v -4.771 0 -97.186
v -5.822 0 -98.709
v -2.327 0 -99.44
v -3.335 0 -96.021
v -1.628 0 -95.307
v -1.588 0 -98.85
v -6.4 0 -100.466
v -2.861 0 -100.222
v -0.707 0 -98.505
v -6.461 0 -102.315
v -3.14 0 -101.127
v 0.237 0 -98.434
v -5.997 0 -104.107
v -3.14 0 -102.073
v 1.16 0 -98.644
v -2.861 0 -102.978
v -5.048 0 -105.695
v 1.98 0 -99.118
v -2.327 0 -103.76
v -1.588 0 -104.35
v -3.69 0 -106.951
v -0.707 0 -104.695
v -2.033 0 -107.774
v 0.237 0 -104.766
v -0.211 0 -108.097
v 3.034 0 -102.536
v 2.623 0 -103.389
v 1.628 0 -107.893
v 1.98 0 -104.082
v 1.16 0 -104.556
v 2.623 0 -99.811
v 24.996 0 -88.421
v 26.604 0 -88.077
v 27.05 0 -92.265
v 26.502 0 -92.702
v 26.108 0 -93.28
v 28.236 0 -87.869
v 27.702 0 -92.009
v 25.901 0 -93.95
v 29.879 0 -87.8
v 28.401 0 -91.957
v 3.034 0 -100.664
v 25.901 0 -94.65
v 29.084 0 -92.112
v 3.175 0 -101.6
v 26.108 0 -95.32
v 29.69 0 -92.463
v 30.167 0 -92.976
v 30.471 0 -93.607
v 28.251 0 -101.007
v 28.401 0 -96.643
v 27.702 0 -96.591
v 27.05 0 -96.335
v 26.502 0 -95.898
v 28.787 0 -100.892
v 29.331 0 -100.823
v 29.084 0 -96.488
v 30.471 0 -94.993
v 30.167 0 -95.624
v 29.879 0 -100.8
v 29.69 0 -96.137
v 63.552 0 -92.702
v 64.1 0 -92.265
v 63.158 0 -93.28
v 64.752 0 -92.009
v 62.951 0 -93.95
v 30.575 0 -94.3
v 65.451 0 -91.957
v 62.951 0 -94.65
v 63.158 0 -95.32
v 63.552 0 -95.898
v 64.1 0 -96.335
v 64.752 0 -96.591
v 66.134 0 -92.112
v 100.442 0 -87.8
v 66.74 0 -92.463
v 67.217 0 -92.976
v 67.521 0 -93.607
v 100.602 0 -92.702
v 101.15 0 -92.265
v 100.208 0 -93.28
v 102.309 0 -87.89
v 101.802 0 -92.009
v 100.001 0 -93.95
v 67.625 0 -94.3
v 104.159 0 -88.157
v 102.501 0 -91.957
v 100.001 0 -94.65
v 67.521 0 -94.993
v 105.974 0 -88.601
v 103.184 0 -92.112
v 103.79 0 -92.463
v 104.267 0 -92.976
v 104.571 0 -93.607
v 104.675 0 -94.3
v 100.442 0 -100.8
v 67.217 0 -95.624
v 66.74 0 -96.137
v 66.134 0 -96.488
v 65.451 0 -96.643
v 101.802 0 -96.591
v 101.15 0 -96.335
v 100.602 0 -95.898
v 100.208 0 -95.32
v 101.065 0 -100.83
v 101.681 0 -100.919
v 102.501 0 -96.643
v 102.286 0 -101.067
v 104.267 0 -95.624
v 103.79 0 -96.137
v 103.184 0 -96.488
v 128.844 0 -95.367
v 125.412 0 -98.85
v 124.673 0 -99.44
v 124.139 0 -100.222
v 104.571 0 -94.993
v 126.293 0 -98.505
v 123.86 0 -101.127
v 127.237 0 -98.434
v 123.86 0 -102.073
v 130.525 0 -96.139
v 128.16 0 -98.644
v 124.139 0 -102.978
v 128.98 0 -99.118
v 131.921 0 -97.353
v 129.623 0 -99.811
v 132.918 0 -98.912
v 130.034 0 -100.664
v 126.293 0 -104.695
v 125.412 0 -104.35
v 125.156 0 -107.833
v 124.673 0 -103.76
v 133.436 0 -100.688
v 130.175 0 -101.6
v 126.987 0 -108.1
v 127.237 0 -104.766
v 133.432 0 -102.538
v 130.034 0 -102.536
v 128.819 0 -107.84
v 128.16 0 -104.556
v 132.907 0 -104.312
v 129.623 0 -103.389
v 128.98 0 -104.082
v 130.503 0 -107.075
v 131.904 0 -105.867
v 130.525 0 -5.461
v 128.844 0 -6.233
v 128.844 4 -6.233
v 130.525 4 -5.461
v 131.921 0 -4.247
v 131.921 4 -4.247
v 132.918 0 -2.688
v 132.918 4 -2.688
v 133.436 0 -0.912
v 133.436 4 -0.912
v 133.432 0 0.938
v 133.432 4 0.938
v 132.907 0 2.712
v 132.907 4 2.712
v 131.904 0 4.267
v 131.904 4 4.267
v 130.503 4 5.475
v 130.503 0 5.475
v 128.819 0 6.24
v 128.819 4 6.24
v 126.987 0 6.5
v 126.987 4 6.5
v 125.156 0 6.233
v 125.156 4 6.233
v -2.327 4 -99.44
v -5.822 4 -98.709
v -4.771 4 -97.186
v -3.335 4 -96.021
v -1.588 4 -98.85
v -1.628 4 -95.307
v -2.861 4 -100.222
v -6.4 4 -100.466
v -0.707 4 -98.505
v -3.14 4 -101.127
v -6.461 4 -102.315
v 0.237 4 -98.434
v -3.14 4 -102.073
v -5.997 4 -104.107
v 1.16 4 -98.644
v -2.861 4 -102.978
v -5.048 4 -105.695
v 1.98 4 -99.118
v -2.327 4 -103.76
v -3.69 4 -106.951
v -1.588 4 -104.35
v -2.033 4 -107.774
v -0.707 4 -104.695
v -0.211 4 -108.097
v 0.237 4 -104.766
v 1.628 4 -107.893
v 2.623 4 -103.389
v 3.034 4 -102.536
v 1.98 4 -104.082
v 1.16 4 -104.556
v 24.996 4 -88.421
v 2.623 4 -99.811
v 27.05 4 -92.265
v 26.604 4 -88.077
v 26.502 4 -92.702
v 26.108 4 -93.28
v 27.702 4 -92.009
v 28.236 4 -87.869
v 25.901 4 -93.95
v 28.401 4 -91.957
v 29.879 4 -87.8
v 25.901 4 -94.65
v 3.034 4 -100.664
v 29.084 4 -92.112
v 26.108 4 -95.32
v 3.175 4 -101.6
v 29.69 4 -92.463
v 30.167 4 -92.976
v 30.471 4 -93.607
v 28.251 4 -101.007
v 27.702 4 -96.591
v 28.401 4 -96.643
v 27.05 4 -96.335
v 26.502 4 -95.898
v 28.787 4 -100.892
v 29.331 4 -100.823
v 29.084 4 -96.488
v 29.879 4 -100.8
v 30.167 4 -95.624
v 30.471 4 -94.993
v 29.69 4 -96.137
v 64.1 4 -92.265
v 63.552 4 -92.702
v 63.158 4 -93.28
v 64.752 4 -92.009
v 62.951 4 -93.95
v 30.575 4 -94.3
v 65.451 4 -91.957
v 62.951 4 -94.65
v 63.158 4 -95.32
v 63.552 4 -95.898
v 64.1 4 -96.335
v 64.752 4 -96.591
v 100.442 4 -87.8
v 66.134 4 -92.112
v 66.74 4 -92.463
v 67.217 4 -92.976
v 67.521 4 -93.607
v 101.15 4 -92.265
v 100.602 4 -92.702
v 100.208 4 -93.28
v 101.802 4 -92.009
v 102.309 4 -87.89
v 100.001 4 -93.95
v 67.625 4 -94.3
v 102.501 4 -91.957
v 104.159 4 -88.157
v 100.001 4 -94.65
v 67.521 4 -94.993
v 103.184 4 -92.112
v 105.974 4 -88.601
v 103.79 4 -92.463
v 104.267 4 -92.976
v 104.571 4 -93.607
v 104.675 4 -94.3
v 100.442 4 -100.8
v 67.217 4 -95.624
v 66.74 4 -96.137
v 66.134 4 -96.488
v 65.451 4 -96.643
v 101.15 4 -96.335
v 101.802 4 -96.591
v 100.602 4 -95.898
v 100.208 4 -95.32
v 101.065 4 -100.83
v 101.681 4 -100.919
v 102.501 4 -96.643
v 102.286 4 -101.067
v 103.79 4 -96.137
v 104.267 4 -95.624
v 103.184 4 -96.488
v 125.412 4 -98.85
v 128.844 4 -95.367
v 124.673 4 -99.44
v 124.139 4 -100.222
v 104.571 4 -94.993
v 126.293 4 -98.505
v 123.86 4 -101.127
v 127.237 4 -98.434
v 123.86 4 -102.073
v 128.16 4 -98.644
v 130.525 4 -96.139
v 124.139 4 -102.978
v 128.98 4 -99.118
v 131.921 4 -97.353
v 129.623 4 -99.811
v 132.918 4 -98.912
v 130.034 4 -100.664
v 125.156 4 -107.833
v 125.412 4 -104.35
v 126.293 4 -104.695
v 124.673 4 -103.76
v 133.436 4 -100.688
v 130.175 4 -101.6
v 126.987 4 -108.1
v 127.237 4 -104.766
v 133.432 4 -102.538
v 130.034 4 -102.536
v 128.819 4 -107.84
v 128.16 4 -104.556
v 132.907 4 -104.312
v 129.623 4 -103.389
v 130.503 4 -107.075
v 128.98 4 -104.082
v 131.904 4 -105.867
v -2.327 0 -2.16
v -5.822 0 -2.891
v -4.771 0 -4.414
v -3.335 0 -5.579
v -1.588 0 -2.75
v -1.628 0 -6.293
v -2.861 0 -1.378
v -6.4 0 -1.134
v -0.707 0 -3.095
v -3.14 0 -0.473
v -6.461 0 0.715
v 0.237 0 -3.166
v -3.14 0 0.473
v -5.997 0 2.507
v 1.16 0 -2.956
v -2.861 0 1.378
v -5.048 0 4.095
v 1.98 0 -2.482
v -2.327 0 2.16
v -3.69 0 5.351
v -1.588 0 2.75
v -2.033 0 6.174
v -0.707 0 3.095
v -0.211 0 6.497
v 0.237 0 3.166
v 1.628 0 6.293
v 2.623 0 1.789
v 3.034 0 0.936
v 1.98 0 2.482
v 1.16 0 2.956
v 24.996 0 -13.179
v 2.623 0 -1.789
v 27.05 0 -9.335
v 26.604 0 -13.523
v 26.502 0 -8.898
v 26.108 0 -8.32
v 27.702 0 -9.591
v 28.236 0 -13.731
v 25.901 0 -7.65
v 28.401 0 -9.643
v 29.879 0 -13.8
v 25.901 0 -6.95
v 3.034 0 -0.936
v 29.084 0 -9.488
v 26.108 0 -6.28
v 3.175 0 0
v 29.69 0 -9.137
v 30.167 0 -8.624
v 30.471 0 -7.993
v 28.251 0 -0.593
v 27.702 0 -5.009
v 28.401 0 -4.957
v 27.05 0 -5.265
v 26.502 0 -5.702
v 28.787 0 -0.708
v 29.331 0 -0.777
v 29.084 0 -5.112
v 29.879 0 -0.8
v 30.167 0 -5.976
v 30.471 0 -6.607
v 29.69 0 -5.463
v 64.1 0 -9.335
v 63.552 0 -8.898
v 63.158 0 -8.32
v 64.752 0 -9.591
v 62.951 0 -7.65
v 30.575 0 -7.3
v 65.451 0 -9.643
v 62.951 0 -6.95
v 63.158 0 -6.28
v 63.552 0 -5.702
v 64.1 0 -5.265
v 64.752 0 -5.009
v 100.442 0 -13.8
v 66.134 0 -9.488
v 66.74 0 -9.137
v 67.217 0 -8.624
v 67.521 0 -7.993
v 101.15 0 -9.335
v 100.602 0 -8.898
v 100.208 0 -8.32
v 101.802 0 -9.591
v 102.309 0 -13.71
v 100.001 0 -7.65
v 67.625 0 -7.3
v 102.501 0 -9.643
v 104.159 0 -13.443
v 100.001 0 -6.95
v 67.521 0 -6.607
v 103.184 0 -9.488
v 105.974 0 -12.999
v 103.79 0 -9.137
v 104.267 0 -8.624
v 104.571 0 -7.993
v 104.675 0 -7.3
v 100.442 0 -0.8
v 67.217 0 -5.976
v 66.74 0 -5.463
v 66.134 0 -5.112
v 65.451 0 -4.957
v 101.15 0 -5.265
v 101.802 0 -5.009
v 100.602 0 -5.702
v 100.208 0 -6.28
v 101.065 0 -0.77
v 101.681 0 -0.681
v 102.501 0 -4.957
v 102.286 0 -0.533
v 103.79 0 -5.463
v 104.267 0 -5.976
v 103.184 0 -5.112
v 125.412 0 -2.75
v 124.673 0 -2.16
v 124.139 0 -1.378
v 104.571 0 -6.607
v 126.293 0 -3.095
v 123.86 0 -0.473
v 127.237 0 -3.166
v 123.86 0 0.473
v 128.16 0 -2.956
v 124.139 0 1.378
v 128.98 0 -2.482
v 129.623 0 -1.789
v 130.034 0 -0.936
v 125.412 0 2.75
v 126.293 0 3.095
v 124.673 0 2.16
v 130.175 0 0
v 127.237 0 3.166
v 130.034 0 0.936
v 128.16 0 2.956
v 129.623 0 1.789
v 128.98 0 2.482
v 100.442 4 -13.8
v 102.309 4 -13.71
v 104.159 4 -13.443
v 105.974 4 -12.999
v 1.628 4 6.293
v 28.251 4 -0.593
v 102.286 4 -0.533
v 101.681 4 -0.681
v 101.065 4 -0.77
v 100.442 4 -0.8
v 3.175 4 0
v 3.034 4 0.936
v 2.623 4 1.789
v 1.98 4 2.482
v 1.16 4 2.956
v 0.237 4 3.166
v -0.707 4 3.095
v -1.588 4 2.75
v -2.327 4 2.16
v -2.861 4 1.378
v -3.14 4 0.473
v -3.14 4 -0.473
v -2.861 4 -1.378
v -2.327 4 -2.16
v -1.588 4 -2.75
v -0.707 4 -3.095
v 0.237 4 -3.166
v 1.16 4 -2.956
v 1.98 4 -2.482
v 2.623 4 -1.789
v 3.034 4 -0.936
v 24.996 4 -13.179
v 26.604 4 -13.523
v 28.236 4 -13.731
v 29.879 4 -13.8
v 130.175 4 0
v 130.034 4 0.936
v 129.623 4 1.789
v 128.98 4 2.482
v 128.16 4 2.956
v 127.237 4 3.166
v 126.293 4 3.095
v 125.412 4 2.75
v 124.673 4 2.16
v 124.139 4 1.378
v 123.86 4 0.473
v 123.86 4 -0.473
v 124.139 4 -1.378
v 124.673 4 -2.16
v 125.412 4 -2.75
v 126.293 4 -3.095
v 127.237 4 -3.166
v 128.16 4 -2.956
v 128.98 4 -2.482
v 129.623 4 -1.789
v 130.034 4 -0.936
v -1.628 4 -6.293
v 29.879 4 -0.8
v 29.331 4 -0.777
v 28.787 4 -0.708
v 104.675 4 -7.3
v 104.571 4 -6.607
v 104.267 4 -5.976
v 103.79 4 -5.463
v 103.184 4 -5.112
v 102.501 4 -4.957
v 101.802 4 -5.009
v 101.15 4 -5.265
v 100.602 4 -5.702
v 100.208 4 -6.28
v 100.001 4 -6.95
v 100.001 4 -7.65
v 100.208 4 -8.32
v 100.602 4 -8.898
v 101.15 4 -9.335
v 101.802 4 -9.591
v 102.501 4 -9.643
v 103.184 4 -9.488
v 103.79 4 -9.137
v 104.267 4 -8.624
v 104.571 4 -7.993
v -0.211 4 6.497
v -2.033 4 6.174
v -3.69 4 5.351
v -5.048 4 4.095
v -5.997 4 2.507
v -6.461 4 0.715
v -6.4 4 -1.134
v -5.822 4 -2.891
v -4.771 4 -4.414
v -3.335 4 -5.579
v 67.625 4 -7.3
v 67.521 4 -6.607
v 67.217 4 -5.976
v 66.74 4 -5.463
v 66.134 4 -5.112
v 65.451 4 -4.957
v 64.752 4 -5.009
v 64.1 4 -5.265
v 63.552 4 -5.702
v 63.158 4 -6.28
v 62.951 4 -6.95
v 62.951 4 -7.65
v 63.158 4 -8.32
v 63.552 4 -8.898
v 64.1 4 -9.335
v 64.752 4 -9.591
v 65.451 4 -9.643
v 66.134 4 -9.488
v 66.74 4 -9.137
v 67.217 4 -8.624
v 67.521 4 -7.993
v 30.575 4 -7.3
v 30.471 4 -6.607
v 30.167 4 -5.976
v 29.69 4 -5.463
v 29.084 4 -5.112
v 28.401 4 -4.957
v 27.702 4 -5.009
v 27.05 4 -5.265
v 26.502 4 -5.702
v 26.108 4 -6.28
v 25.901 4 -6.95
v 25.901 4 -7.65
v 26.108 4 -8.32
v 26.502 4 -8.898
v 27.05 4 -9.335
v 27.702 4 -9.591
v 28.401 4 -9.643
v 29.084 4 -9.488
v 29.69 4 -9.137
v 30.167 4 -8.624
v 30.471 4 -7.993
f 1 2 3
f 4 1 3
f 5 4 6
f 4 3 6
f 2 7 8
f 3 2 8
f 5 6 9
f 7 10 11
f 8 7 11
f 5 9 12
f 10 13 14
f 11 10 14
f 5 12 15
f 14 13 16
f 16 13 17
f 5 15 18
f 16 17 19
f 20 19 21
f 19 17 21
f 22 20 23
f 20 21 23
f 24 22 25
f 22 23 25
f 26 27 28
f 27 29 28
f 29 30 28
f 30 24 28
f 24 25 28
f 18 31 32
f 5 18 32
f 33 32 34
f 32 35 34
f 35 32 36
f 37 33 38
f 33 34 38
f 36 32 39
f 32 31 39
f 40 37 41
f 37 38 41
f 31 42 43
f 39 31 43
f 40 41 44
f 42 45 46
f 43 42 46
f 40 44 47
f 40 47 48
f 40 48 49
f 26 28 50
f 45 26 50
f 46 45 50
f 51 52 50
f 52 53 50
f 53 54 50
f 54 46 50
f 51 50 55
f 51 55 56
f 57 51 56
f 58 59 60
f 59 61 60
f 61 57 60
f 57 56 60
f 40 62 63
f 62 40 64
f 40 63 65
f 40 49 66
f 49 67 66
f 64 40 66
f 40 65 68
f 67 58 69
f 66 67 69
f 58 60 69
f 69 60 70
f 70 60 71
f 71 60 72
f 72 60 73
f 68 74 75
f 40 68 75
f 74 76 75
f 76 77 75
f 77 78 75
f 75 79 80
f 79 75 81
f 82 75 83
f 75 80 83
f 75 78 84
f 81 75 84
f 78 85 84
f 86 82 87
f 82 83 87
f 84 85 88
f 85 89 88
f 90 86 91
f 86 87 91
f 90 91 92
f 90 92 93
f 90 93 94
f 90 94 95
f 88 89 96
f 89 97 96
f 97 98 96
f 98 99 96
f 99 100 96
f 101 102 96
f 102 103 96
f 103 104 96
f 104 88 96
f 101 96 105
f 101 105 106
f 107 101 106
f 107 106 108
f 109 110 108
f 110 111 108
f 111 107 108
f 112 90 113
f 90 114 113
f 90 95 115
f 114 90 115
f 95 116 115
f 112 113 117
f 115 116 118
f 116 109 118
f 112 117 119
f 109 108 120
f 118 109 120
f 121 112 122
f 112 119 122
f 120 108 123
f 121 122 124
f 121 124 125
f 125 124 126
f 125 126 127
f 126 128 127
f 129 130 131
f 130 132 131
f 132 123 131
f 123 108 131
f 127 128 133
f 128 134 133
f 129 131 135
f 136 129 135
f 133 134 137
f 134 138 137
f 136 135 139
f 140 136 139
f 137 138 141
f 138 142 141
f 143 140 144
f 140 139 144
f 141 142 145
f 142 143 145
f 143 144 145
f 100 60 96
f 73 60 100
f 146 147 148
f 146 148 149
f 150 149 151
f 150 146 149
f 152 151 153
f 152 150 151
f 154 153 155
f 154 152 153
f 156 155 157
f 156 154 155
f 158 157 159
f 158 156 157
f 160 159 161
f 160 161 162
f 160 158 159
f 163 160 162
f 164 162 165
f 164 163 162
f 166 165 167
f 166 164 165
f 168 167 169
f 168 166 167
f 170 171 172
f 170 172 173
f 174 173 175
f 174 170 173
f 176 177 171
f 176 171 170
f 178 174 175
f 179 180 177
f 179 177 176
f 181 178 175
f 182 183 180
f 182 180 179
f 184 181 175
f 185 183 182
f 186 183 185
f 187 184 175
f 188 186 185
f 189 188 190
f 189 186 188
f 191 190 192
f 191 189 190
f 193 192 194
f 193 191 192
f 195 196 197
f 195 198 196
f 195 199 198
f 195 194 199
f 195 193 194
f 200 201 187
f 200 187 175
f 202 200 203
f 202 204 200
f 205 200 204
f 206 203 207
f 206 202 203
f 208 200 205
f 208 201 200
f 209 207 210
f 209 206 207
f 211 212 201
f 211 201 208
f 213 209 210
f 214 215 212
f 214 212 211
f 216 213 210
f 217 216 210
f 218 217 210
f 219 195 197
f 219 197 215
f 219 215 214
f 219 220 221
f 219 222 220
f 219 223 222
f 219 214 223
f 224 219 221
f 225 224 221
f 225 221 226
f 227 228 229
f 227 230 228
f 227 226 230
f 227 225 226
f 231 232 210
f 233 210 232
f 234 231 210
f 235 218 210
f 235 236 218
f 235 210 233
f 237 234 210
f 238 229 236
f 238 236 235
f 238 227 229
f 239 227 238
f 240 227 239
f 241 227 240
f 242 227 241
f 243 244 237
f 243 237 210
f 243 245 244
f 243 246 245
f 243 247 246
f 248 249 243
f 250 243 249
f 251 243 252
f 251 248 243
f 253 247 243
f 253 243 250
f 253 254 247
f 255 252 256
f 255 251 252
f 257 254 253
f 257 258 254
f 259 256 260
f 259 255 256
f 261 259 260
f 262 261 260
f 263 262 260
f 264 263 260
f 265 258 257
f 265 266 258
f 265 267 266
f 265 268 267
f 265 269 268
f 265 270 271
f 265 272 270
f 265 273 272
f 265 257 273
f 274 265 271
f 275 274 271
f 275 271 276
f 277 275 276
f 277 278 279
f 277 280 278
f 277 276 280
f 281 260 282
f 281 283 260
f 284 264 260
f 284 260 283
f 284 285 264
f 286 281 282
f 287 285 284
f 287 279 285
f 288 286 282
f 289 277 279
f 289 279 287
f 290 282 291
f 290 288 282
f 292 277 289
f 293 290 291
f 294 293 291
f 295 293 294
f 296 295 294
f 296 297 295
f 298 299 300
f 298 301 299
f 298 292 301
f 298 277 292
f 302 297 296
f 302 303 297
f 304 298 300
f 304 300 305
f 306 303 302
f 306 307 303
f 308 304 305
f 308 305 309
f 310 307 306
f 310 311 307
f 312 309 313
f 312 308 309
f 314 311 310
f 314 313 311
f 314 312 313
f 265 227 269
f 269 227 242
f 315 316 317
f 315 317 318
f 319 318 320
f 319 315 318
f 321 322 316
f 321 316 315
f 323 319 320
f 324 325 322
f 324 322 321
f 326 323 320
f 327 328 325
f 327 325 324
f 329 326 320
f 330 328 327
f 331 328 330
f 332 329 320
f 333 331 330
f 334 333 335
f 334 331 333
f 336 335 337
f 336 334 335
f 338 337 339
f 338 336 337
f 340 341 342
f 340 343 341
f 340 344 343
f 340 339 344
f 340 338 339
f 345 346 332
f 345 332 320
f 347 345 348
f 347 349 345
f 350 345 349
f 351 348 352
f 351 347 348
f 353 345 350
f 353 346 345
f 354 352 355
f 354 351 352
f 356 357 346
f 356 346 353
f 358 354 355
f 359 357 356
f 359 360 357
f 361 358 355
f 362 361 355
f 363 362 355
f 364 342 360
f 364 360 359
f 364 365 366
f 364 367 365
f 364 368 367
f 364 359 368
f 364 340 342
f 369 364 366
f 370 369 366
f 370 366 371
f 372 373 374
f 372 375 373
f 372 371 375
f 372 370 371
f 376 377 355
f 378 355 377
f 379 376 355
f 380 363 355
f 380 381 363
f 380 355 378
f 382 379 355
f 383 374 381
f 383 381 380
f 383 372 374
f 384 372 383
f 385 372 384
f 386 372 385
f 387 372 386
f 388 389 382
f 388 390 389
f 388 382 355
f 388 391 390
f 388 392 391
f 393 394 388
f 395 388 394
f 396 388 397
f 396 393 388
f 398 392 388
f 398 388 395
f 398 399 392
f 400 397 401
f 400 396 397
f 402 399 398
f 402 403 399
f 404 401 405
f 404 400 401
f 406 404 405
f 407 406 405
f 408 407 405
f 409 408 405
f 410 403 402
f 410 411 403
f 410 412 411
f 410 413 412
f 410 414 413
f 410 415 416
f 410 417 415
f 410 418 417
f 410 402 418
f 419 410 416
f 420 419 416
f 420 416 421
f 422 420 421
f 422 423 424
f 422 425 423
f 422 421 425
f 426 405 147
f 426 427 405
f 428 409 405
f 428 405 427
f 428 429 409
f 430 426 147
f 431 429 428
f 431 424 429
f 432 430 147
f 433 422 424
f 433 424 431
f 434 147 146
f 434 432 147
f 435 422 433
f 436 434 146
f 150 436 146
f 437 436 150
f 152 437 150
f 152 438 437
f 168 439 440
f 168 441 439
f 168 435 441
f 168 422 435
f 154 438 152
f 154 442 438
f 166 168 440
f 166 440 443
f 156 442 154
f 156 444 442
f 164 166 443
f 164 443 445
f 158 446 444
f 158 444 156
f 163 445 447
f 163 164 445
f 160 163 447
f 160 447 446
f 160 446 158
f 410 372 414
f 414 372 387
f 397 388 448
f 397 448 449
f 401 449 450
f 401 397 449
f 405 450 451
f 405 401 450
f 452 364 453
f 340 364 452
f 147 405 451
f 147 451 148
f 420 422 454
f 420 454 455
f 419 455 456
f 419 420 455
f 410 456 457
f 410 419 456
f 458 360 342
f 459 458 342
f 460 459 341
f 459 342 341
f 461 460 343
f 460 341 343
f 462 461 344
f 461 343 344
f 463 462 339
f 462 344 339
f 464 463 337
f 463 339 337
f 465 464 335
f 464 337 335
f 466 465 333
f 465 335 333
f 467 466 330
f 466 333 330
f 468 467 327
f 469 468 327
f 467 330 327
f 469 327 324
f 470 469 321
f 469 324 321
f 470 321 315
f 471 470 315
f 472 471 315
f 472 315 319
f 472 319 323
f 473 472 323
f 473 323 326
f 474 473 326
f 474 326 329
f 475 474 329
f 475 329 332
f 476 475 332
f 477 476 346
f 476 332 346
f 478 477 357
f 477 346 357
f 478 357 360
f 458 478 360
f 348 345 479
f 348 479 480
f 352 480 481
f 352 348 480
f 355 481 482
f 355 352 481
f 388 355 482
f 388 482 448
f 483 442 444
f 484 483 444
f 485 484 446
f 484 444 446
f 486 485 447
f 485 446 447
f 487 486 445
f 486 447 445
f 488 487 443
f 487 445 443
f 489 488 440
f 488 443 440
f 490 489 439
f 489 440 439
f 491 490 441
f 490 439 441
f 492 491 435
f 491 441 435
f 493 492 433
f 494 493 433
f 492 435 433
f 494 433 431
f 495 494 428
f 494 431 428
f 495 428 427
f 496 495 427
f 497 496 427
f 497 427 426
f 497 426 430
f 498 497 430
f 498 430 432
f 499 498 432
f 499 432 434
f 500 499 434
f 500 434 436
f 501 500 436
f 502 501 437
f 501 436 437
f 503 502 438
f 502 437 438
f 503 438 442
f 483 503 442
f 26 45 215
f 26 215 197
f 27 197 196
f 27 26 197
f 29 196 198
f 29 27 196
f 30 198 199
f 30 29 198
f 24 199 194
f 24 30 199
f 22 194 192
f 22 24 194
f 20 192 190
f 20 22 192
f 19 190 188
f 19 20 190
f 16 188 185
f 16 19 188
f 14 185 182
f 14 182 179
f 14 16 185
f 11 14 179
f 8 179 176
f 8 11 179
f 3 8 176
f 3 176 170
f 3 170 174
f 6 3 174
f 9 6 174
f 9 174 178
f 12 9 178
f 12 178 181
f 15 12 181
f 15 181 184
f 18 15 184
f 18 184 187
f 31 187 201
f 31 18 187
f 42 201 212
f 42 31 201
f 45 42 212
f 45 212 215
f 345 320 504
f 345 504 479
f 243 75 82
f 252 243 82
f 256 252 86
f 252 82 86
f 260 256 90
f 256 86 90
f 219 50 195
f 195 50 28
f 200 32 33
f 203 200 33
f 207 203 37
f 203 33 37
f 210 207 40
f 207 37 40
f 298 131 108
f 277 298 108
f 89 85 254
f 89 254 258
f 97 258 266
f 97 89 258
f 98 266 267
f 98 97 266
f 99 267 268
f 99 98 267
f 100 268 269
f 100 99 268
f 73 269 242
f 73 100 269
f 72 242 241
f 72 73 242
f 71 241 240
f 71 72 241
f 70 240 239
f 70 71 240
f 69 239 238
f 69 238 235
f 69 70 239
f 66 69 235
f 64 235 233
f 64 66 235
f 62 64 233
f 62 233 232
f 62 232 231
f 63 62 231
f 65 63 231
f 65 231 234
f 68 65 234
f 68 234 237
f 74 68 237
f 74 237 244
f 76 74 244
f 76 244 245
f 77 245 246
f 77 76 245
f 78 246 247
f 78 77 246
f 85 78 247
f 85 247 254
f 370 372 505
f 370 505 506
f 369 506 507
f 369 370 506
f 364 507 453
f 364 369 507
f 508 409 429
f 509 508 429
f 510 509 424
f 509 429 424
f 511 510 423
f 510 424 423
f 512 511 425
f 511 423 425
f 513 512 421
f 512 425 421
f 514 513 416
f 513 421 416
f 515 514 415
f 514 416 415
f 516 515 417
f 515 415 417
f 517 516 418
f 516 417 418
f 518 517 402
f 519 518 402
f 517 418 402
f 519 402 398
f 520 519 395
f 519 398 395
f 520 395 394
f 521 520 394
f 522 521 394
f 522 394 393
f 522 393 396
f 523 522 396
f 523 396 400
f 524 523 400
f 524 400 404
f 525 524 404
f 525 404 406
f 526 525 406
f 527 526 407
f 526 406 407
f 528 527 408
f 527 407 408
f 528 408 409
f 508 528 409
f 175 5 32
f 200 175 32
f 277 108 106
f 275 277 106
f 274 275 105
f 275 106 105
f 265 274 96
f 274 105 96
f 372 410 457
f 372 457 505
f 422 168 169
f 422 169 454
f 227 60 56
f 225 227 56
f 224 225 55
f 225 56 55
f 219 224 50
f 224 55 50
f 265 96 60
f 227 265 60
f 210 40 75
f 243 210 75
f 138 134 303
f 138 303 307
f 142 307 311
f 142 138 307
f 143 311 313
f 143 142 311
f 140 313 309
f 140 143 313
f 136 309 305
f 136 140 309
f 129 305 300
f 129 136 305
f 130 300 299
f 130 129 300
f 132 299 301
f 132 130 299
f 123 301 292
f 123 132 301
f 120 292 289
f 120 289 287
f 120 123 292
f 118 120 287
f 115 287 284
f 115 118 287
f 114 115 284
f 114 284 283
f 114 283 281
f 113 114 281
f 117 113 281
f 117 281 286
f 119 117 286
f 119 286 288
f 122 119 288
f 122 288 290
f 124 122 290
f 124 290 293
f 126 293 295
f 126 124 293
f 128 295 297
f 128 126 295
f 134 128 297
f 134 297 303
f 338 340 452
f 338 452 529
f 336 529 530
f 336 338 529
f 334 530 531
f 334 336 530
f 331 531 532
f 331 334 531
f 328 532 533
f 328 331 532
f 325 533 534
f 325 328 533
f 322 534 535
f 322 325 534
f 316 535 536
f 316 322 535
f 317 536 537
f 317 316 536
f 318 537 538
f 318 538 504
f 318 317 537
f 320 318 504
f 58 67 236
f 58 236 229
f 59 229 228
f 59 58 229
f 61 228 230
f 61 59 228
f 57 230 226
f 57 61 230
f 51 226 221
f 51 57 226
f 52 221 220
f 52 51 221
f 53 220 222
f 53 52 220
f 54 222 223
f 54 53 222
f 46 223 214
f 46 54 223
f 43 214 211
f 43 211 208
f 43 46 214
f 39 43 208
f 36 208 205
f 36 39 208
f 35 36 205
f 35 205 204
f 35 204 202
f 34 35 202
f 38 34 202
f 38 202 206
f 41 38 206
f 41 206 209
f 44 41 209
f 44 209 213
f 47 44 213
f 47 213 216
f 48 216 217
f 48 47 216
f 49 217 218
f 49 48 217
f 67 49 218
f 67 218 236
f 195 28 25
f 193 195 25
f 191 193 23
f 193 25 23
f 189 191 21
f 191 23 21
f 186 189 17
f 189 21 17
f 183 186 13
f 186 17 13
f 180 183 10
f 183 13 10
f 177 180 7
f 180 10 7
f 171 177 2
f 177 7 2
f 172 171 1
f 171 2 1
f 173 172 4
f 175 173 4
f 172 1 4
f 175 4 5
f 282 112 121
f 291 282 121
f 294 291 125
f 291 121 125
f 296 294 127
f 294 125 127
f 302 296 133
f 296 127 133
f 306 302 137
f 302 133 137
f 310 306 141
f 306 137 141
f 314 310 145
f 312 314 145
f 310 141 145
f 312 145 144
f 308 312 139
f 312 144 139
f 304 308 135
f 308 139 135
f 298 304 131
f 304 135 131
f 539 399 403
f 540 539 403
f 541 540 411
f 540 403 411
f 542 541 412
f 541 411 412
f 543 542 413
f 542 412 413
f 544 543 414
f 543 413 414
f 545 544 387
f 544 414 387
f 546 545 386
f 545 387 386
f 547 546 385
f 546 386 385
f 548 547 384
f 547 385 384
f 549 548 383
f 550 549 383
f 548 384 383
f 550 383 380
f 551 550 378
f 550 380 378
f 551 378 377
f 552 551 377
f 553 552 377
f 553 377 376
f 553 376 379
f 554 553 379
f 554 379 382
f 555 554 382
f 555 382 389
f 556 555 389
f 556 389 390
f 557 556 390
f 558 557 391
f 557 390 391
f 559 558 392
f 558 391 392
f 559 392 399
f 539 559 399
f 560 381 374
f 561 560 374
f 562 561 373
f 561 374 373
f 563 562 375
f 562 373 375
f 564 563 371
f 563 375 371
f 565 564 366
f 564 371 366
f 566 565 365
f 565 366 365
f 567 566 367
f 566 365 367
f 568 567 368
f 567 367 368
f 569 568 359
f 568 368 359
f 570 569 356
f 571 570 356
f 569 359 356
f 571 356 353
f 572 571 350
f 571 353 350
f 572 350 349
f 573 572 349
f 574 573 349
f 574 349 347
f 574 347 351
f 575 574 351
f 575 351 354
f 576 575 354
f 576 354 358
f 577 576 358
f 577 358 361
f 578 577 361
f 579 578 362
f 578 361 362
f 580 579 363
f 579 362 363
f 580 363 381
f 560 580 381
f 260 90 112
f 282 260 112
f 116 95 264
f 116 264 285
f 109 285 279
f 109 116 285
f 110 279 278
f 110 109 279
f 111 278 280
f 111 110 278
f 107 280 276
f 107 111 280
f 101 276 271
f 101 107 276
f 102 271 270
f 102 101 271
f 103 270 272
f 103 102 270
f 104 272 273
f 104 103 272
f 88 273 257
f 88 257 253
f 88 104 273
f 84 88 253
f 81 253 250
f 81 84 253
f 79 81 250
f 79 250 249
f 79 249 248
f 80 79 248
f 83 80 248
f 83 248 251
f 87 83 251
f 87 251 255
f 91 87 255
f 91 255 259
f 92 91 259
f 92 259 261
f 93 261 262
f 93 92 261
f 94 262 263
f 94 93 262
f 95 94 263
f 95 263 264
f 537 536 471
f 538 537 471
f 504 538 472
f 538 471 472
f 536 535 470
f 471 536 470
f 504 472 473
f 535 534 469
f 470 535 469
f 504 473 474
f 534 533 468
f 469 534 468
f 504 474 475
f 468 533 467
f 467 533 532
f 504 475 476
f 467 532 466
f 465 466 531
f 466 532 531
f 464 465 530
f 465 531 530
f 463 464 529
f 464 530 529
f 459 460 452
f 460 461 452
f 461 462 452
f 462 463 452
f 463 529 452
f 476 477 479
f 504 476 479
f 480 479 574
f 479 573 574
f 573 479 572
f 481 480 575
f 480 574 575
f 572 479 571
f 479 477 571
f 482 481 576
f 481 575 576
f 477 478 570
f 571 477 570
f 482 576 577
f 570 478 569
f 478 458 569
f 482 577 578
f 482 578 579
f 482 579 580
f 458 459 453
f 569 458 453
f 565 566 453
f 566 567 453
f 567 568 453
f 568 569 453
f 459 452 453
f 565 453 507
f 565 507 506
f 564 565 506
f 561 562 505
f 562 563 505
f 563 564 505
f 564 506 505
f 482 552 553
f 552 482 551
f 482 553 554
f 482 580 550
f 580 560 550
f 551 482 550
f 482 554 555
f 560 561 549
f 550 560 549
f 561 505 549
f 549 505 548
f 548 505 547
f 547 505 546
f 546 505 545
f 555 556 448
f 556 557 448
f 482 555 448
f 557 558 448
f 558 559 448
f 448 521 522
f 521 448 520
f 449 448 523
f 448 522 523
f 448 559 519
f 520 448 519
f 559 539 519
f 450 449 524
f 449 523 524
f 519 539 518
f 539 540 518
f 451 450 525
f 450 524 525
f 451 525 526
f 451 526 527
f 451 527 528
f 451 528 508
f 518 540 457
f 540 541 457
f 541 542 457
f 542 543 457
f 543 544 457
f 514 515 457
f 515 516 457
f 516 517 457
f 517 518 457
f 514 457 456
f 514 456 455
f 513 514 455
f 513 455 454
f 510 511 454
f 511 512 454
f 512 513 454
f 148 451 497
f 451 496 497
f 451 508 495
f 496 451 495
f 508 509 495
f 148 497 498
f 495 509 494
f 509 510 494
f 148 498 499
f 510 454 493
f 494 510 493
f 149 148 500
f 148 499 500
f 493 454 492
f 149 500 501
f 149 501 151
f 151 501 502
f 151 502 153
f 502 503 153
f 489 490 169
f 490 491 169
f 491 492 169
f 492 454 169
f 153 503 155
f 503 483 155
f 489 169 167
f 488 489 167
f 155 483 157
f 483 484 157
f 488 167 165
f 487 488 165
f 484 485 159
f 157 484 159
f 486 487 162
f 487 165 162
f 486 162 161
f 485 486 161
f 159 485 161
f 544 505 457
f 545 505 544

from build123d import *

# Parameters (mm, degrees)
SKETCH3_R           = 2.35
SKETCH3_R_2         = 3.175
BOSS_EXTRUDE1_DEPTH = 4


with BuildPart() as part:
    # Sketch3 → Boss-Extrude1 (new body)
    with BuildSketch(Plane(origin=(0, 0, 0), x_dir=(1, 0, 0), z_dir=(0, 1, 0))):
        with BuildLine():
            Line((-1.62757842, 95.307068371), (24.996187397, 88.421205113))
            ThreePointArc((24.996187397, 88.421205113), (27.417876161, 87.955924676), (29.878922656, 87.8))
            Line((29.878922656, 87.8), (100.442332088, 87.8))
            ThreePointArc((100.442332088, 87.8), (103.237177873, 88.001325511), (105.97431353, 88.601144919))
            Line((105.97431353, 88.601144919), (128.843993814, 95.367048306))
            ThreePointArc((128.843993814, 95.367048306), (133.232951694, 103.443993814), (125.156006186, 107.832951694))
            Line((125.156006186, 107.832951694), (102.286325902, 101.067048306))
            ThreePointArc((102.286325902, 101.067048306), (101.373947349, 100.867108504), (100.442332088, 100.8))
            Line((100.442332088, 100.8), (29.878922656, 100.8))
            ThreePointArc((29.878922656, 100.8), (29.058573824, 100.851974892), (28.251344236, 101.007068371))
            Line((28.251344236, 101.007068371), (1.62757842, 107.892931629))
            ThreePointArc((1.62757842, 107.892931629), (-6.292931629, 103.22757842), (-1.62757842, 95.307068371))
        make_face()
        with Locations((28.225, 94.3)):
            Circle(SKETCH3_R, mode=Mode.SUBTRACT)
        with Locations((65.275, 94.3)):
            Circle(SKETCH3_R, mode=Mode.SUBTRACT)
        with Locations((102.325, 94.3)):
            Circle(SKETCH3_R, mode=Mode.SUBTRACT)
        with Locations((127, 101.6)):
            Circle(SKETCH3_R_2, mode=Mode.SUBTRACT)
        with Locations((0, 101.6)):
            Circle(SKETCH3_R_2, mode=Mode.SUBTRACT)
    extrude(amount=BOSS_EXTRUDE1_DEPTH)


with BuildPart() as body_2:
    # Mirror3: mirrored copy
    add(part.part.mirror(Plane.XY.offset(-50.8)))


solid = Compound([part.part, body_2.part])
